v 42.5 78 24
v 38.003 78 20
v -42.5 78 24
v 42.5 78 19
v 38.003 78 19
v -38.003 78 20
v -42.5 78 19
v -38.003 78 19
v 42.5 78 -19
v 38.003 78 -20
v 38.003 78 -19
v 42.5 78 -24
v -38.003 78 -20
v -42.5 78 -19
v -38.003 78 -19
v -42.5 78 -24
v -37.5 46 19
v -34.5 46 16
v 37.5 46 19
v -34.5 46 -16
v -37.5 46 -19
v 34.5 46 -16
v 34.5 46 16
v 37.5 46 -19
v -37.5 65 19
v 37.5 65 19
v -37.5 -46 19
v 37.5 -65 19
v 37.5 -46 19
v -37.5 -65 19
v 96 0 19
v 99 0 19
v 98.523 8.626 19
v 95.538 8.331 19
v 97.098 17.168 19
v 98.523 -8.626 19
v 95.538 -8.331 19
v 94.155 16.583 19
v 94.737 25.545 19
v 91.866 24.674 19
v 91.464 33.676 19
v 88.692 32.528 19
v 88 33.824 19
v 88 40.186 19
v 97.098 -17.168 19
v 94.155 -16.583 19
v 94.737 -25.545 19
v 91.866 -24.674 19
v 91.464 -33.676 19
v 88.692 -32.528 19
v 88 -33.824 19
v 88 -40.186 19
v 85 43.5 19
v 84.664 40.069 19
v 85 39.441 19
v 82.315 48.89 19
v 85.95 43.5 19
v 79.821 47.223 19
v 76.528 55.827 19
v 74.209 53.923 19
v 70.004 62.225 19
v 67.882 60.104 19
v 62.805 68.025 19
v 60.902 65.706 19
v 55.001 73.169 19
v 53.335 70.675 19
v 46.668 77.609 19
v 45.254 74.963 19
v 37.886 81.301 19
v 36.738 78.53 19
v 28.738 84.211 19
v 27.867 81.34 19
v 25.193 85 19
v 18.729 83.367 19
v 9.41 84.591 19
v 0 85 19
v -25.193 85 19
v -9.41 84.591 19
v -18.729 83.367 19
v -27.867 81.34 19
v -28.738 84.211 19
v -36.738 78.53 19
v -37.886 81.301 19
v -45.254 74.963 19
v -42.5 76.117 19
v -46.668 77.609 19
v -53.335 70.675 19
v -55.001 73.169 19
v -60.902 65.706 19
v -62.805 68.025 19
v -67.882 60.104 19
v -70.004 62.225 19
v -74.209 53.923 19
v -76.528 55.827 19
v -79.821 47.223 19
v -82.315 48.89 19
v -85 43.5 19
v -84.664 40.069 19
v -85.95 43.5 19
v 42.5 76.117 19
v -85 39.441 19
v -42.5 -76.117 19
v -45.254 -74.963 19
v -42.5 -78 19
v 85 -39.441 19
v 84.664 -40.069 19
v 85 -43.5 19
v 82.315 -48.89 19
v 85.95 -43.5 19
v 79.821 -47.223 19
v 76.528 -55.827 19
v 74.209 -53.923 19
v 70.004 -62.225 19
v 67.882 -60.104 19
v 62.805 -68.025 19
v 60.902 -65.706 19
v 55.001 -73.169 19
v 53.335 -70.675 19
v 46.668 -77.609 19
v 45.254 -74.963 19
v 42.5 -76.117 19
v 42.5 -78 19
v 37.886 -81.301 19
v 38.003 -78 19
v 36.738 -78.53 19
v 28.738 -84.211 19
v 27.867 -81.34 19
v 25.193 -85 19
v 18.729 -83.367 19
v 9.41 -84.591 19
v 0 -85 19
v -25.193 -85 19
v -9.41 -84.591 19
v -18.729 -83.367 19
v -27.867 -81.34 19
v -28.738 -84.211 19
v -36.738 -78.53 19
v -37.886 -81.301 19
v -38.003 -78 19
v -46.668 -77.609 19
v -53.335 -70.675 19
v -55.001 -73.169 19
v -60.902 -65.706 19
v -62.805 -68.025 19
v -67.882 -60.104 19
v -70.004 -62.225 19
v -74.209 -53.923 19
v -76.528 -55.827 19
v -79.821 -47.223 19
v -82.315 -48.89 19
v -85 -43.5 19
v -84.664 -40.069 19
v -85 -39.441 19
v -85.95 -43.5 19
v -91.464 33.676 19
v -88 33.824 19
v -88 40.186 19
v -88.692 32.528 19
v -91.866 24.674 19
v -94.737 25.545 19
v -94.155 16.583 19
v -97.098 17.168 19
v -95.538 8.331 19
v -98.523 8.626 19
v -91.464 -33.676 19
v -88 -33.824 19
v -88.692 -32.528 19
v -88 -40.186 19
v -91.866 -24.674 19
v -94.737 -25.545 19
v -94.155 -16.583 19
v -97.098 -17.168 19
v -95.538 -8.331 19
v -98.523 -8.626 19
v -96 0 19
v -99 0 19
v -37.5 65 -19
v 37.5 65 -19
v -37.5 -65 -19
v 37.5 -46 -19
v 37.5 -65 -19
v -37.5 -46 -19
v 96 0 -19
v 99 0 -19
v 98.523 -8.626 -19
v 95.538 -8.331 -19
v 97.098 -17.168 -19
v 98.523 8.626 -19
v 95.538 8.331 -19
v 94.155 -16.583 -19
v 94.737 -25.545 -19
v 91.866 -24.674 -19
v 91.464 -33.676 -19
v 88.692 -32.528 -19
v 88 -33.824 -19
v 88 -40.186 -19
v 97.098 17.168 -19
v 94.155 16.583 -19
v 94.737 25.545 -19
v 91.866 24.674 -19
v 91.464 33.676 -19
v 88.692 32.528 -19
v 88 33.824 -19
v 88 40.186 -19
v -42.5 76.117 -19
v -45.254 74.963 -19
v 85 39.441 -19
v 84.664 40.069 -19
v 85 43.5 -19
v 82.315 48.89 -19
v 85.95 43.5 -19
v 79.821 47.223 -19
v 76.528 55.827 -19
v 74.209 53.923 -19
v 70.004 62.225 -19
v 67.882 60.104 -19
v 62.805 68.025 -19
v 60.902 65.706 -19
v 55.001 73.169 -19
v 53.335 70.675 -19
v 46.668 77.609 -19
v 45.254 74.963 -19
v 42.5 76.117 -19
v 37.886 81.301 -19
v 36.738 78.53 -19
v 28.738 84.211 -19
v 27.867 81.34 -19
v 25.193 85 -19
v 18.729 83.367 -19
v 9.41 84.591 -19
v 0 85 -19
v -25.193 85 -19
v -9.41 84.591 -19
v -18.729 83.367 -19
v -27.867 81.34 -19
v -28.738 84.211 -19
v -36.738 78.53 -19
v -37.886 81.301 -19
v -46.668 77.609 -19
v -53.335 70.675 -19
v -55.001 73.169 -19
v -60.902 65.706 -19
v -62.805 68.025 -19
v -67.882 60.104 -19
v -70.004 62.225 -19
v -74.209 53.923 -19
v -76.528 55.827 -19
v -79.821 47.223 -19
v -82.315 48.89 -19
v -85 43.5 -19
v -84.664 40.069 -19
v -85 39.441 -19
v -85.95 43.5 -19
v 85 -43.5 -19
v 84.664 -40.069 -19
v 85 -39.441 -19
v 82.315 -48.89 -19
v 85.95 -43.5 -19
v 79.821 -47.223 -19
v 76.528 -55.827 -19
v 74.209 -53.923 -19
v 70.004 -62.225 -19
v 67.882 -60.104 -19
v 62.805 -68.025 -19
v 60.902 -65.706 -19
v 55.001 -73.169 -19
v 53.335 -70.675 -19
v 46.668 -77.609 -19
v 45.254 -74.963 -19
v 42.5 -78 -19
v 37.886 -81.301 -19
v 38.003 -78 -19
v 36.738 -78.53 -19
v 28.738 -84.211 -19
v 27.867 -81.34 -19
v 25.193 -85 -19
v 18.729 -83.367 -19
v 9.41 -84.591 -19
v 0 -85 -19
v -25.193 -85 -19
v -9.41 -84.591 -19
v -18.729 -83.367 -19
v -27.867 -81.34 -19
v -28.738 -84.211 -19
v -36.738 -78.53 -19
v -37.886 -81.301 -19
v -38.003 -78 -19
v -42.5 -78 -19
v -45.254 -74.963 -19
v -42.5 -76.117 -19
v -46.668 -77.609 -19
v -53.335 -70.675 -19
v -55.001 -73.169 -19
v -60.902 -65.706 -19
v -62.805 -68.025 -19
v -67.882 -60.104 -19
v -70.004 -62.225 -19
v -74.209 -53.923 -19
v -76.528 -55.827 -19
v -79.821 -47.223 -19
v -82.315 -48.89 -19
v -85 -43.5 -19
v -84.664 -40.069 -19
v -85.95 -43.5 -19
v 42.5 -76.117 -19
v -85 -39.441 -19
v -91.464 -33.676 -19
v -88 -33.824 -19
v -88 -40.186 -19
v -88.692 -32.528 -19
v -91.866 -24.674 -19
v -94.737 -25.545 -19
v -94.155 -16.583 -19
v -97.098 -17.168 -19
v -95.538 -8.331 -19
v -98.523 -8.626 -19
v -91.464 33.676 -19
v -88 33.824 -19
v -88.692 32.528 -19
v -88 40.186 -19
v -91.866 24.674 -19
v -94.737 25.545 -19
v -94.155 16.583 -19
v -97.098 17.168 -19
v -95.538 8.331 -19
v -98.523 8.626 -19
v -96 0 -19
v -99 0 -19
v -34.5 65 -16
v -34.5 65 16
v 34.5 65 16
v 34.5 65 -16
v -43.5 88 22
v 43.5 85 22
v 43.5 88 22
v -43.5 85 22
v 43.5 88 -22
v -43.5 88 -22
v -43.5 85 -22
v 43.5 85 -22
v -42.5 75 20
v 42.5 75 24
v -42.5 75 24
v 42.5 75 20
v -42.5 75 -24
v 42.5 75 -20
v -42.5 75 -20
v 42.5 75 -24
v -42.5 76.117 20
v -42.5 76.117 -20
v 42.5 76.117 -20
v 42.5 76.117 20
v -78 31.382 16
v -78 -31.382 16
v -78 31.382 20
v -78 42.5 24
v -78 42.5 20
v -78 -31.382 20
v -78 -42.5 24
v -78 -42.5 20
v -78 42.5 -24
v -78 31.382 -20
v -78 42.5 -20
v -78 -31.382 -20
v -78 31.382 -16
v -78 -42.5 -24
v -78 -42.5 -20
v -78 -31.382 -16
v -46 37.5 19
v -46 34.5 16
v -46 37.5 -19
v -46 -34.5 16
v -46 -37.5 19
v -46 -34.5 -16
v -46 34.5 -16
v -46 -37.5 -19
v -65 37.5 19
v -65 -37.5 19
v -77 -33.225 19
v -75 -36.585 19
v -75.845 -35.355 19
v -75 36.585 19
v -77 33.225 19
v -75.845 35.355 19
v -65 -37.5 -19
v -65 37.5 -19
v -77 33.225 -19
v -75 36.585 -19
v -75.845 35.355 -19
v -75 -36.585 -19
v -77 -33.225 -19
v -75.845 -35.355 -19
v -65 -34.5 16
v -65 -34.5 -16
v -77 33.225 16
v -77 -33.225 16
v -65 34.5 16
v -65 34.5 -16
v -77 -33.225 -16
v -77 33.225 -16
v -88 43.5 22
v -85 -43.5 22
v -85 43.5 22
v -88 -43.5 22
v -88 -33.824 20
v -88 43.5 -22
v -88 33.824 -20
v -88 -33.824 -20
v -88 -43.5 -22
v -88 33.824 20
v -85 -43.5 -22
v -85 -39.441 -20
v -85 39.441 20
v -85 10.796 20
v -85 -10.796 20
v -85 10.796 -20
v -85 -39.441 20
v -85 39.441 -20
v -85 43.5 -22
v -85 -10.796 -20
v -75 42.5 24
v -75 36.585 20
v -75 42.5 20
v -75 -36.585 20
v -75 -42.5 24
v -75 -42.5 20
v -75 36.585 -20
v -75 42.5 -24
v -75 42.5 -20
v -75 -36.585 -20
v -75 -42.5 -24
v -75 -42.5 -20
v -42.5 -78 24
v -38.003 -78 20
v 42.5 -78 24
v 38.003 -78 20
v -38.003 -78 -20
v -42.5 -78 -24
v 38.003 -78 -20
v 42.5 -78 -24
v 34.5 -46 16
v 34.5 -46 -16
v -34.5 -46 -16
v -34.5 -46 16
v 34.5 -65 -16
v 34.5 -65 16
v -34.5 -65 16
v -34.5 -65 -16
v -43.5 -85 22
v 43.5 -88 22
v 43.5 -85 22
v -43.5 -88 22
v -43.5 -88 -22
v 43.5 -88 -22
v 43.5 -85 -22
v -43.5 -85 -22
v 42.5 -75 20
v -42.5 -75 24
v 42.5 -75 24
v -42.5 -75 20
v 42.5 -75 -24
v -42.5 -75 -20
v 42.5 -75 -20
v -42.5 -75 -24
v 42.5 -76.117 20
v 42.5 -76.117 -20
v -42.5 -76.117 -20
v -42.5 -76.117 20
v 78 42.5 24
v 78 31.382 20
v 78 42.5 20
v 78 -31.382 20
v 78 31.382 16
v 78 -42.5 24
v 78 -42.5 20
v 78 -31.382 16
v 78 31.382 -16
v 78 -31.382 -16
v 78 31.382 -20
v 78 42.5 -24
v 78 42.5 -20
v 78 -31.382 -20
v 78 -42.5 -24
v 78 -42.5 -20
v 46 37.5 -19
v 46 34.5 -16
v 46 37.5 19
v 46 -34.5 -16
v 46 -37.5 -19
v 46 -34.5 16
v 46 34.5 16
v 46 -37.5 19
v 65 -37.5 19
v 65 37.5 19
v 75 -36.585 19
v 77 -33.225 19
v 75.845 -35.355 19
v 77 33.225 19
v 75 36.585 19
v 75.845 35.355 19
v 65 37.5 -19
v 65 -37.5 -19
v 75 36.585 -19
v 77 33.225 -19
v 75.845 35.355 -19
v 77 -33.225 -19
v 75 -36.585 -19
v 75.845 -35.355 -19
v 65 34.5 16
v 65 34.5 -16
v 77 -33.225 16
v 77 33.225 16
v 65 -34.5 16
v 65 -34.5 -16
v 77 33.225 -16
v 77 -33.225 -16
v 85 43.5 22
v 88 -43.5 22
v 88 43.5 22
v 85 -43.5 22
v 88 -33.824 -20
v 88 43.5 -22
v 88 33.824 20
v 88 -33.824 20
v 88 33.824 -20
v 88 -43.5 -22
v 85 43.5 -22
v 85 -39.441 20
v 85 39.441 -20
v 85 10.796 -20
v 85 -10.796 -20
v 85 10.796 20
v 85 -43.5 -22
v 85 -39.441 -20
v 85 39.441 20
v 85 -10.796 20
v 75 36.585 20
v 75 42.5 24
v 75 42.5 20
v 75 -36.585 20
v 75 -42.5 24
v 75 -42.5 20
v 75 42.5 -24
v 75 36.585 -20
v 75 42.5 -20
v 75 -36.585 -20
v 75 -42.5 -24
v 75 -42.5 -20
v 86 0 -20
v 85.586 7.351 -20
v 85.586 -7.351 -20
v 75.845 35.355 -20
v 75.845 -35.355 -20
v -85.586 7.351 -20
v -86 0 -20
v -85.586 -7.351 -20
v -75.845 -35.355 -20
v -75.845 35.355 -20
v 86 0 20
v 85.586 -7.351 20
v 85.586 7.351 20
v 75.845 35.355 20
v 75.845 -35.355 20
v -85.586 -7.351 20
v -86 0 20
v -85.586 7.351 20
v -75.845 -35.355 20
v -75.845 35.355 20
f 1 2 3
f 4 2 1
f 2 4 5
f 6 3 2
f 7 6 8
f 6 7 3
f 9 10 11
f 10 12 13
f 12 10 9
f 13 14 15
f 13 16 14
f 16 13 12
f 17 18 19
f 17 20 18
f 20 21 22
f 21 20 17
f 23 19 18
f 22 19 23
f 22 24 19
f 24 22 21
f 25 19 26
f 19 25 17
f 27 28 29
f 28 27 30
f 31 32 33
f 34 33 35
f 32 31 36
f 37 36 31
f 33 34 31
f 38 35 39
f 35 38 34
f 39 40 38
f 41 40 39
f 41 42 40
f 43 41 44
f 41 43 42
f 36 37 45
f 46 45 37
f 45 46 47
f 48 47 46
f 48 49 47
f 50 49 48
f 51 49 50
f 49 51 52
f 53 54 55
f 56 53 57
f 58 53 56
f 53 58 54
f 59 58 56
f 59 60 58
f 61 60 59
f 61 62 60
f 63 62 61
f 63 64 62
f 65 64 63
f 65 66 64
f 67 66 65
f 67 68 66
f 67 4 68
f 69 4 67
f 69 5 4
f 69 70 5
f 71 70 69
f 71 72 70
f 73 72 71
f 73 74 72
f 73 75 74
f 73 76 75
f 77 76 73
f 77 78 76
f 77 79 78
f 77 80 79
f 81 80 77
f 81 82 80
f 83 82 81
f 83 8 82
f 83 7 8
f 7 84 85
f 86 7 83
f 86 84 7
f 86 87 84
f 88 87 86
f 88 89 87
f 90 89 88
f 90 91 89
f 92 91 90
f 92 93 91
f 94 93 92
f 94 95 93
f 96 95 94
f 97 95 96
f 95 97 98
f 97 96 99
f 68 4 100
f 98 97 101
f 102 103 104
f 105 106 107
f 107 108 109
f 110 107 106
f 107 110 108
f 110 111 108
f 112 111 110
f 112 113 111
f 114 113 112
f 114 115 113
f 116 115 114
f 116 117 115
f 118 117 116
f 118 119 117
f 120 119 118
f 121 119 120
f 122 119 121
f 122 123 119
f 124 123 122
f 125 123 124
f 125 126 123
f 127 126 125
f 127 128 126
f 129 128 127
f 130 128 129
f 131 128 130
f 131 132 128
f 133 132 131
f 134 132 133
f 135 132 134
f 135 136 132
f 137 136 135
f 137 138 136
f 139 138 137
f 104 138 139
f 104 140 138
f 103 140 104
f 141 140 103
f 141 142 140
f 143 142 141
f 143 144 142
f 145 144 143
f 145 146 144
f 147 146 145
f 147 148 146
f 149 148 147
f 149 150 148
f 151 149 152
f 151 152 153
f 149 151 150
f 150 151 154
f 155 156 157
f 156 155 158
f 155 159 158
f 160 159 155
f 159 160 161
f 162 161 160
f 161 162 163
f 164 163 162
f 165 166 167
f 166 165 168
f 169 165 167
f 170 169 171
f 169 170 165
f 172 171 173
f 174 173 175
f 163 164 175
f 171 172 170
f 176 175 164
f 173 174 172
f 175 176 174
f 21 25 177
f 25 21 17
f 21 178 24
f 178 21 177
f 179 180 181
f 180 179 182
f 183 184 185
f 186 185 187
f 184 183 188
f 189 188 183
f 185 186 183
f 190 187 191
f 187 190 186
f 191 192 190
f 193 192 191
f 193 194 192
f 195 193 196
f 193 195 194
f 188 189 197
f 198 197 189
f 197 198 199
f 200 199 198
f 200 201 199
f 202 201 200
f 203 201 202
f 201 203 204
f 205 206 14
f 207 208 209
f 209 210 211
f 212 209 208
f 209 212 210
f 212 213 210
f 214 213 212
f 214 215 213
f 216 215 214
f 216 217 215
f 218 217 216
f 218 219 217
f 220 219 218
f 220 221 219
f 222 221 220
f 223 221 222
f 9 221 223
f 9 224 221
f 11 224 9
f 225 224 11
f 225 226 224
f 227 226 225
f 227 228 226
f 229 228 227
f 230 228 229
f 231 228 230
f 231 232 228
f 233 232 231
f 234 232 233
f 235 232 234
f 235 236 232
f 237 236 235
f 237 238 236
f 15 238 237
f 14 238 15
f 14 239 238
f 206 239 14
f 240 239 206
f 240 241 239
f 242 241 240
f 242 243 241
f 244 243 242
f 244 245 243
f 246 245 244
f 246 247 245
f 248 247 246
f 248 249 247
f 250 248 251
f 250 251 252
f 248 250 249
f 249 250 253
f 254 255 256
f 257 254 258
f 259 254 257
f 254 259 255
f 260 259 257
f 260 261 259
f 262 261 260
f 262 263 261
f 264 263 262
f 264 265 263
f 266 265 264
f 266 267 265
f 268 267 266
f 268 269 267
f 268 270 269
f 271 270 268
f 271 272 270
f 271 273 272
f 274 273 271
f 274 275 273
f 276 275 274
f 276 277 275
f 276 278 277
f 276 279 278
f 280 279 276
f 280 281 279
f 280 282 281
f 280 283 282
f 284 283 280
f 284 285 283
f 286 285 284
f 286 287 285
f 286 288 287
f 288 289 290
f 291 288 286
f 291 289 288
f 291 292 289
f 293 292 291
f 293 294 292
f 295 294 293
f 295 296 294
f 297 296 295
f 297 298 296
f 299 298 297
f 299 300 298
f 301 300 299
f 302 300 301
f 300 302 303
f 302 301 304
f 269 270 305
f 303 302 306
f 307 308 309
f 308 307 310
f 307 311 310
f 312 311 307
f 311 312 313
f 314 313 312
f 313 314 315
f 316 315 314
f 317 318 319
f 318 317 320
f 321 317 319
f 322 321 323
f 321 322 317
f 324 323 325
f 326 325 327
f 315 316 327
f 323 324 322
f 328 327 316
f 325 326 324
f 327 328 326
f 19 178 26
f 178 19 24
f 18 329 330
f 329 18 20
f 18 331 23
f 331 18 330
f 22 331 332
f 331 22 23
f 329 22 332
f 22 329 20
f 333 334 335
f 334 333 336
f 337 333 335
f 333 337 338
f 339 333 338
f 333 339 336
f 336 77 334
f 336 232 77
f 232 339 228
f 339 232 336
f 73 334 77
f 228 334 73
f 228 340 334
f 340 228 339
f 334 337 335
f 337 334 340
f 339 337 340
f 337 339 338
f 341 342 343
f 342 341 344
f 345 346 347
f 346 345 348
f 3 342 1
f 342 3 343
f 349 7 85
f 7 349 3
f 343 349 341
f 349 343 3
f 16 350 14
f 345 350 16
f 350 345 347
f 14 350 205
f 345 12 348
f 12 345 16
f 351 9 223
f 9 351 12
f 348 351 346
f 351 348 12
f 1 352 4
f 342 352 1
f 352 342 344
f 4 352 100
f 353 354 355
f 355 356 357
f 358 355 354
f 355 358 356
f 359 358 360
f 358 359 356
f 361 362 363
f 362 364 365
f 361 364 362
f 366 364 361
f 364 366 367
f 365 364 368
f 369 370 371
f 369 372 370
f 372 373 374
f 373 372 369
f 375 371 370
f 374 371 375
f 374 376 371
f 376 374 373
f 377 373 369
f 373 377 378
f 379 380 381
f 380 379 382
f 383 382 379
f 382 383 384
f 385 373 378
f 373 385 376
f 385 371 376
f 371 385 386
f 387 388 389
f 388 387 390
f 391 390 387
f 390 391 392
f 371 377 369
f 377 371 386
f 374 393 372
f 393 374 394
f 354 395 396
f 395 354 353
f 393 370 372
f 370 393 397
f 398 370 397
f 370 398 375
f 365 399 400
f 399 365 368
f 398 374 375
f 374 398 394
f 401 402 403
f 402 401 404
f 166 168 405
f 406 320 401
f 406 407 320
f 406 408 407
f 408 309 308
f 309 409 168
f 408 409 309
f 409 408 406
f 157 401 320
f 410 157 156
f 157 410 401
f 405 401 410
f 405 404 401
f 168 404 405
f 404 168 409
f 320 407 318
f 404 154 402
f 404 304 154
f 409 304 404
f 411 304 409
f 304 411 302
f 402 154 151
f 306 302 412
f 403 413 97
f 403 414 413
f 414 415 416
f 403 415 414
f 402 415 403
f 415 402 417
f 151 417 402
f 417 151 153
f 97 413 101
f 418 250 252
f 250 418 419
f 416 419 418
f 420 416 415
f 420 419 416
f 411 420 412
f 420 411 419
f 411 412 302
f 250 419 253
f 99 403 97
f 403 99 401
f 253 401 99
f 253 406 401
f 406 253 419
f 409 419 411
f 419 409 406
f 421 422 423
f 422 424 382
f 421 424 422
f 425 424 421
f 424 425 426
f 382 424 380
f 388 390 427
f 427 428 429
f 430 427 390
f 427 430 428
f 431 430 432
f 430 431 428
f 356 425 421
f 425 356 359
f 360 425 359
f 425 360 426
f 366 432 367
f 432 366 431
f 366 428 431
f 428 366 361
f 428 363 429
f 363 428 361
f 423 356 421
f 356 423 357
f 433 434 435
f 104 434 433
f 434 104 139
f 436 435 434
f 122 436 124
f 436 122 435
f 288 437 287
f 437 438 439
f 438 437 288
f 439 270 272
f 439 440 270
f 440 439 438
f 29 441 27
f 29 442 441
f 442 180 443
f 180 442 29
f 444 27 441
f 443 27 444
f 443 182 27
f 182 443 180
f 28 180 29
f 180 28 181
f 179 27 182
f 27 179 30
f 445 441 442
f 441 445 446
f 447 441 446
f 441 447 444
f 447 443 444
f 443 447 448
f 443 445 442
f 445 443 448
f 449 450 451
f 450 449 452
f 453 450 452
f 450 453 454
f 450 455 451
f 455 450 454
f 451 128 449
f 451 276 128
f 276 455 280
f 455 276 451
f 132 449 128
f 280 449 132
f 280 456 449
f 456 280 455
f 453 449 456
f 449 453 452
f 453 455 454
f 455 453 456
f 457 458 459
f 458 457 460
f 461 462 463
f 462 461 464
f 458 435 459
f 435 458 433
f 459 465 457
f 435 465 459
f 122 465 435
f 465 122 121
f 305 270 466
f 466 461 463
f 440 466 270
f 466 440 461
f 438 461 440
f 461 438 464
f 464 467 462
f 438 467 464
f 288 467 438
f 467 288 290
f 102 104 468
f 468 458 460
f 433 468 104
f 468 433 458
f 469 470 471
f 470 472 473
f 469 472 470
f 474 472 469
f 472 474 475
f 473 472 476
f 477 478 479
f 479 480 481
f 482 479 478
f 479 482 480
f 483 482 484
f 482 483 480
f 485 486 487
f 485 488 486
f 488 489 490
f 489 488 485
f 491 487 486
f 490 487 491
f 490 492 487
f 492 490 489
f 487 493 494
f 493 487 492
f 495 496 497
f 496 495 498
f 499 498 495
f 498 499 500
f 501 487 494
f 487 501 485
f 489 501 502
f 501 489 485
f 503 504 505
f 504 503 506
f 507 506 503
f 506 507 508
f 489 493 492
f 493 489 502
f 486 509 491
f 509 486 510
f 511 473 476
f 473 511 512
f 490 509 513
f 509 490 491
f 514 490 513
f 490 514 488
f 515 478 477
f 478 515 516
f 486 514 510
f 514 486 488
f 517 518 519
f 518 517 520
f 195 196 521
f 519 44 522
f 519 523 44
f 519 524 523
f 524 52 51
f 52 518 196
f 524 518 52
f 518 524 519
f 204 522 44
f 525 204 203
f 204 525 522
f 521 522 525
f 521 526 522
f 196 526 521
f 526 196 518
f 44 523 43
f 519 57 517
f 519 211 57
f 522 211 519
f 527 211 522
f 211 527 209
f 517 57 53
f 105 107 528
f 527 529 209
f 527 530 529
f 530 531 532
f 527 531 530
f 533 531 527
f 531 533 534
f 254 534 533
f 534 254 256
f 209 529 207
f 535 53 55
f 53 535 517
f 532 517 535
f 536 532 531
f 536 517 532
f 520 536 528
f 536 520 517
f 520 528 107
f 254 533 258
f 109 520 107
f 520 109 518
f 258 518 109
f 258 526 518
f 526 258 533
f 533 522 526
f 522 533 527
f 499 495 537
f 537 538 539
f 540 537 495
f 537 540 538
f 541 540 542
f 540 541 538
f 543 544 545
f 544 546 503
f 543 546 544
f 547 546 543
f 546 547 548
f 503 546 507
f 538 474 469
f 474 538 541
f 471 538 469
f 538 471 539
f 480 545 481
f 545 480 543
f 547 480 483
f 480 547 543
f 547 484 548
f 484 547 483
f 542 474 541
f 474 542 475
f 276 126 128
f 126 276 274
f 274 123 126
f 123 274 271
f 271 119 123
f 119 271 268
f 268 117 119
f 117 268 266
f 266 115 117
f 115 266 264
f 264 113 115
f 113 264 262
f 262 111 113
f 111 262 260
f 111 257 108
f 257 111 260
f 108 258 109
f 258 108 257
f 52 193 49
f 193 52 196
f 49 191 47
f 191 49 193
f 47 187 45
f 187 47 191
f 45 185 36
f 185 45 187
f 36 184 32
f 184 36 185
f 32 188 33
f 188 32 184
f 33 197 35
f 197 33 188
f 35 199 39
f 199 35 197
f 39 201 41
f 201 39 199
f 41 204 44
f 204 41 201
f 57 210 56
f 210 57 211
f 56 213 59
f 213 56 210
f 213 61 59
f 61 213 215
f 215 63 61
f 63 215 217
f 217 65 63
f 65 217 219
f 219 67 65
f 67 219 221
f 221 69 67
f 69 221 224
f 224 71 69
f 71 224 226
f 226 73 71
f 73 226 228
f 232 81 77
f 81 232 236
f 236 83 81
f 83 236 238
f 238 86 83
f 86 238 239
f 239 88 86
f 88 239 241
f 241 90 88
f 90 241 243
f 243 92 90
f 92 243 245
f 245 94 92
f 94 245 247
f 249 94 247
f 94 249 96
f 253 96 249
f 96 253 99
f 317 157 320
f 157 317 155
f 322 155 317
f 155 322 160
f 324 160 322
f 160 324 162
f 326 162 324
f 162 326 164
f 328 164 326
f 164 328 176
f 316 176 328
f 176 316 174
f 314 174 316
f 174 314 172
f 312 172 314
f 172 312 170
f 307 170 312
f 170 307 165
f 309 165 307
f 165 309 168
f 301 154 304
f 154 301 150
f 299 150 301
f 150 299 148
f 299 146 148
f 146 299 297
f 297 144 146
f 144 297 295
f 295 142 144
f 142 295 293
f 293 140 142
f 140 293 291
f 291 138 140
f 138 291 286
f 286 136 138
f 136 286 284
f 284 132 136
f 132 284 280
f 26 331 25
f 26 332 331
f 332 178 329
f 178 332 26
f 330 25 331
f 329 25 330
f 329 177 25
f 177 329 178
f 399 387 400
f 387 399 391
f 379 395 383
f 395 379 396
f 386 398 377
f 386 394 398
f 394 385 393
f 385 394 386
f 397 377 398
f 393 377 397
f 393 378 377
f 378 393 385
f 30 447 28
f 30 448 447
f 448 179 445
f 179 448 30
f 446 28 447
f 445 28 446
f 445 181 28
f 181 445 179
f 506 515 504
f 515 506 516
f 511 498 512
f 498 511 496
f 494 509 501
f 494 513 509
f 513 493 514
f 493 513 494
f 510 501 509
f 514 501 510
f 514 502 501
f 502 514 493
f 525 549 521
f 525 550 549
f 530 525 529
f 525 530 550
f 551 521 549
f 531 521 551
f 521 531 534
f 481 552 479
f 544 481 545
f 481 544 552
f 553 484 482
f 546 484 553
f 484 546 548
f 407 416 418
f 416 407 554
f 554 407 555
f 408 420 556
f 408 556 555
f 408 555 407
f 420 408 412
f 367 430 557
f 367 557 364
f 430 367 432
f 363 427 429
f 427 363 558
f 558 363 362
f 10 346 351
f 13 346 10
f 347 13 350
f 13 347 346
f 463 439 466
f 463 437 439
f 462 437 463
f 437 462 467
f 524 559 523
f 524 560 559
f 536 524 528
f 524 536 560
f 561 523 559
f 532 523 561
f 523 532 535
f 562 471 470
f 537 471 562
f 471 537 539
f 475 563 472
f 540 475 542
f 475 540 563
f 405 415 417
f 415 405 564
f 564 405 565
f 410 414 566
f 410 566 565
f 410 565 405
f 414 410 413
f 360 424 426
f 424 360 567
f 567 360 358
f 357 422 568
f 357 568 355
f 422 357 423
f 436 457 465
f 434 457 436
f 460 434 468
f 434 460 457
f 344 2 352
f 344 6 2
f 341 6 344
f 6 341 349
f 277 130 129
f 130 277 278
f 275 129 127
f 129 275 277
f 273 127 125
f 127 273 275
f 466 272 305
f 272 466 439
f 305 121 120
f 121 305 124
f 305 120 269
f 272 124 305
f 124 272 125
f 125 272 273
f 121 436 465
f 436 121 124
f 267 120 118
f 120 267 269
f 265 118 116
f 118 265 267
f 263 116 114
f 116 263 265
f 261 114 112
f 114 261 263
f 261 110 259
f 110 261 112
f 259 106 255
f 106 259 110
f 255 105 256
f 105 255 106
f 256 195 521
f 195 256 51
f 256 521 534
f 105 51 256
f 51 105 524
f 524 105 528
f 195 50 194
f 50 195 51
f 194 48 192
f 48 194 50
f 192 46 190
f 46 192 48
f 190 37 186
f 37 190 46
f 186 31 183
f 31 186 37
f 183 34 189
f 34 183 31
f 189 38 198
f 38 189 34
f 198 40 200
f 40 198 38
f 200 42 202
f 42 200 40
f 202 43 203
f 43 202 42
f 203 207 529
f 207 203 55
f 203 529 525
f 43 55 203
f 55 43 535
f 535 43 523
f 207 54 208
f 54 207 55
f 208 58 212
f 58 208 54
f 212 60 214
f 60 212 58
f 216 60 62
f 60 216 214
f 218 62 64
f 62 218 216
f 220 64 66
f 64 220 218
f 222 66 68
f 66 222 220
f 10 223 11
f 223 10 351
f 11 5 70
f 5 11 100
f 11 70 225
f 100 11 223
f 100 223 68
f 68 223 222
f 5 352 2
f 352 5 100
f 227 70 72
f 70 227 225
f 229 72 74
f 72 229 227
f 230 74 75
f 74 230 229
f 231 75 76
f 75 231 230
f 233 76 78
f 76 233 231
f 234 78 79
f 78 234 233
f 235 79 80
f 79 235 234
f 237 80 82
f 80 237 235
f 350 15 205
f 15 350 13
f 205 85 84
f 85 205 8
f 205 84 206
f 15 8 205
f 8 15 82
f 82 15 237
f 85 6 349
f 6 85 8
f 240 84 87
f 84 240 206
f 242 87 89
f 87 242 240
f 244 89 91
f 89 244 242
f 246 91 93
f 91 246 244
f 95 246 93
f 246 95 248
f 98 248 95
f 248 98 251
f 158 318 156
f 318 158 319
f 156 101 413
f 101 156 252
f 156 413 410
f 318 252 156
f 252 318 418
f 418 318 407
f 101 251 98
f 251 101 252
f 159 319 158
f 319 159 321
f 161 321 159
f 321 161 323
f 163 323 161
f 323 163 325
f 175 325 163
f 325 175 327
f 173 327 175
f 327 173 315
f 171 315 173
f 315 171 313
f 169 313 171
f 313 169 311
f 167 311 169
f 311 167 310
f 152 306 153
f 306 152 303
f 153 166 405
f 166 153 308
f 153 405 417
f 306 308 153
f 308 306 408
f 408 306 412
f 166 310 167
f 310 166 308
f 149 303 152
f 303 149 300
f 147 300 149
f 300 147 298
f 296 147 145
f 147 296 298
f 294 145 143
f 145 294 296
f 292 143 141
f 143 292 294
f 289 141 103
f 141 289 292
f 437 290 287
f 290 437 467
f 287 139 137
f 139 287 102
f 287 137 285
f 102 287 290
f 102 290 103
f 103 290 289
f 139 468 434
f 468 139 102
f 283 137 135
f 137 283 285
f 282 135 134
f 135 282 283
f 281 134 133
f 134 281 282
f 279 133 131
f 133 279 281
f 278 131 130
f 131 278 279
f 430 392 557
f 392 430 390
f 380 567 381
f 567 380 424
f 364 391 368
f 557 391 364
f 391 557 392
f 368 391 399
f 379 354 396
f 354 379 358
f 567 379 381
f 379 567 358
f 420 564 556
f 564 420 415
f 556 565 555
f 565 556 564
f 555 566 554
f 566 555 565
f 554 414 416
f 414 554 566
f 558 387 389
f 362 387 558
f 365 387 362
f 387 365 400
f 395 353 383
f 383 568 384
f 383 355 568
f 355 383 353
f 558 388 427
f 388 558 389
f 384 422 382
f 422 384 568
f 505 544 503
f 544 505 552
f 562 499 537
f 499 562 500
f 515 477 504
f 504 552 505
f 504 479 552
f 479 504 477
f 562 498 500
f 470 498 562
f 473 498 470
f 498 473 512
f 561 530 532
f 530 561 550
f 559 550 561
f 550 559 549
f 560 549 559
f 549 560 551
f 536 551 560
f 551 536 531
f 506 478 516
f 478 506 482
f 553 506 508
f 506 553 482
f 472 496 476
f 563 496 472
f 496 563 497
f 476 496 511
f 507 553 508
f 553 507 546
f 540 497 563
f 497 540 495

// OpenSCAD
// ===========================================================================
// HULL-FRAME COORDINATE STANDARD - Rev R1 (2026-06-11).  See CLAUDE.md.
//   Hull frame (canonical for ALL design artifacts): X = +port (left),
//   Y = +aft (back), Z = +dorsal (up); origin = SerenityAssembly.FCStd
//   world origin.  Primary-component STLs published to airframe/stls/
//   are stored directly in hull frame, baked by tools/bake_hull_frame.py
//   (marker 'SerenityUAV HULL-FRAME R1' in the binary STL header).
//   NEVER re-bake a mesh derived from an already-baked file.
//   This file:
//     Part-local frame.  DEFERRED - Phase 11 (aft fuselage EDF).  On
//     integration, position in hull frame per the validated assembly and
//     bake or place explicitly; stations quoted from nose convert to hull
//     Y via nose tip at hull Y = -305.6 mm.
// ===========================================================================
// s_neck_intake_frame.scad
// CF-PETG structural intake frame ring for Serenity Rev N 24" hull.
// Bonds into the 4 radial scoop cutouts in s_middle_canonical_edf_intake.stl
// at the neck station (Z = 30 mm in the neck shell, Z-longitudinal coords).
// Print in CF-PETG; bond with structural epoxy.
//
// Rev C (2026-06-02): Z-longitudinal axis correction.
//   Coordinate system: Z = longitudinal (fore-aft), X = lateral, Y = vertical.
//   Both middle and rear shells sit on their flat Z=0 face for printing.
//   Hull dimensions re-measured via Z-slice at Z=30 mm.
//   See blender_middle_intake_cut.py Rev C for matching hull cut parameters.
//
// Coordinate origin: hull XY centreline at intake station.
// Frame axial direction = Z (same as hull longitudinal).

// ── Hull cross-section at intake station Z = 30 mm (measured, 24" scale) ────
// Source: Z-slice sweep of s_middle_canonical_shell24.stl,
//   Serenity UAV project log 2026-06-02 (Z-longitudinal Rev C).
// At Z=30: X span=177 mm (centre X=180.9), Y span=156.5 mm (centre Y=-77.8).
// Half-dimensions from XY centreline:
//   X half-width  = 88.5 mm → HULL_W2 = 89
//   Y half-height = 78.3 mm → HULL_H2 = 78
HULL_W2  = 89;     // X lateral half-width from centreline       [mm]
HULL_H2  = 78;     // Y vertical half-height from centreline     [mm]
HULL_WL  = 177;    // full width  (= 2 × HULL_W2 − 1)
HULL_HL  = 157;    // full height (= 2 × HULL_H2 + rounding)

// ── Scoop window dimensions ──────────────────────────────────────────────────
// Matched to blender_middle_intake_cut.py Rev C: SCOOP_W=75, SCOOP_H=38.
// X-scoops: 48 mm wall remaining.  Y-scoops: 37 mm wall remaining.
// Total capture area: 4 × 75 × 38 = 11 400 mm² (≈ 107 % of EDF fan annulus).
SCOOP_W  = 75;     // circumferential window width               [mm]
SCOOP_H  = 38;     // radial window height                       [mm]

// ── Frame geometry ───────────────────────────────────────────────────────────
FRAME_AX = 38;     // axial length of frame ring (matches SCOOP_AX) [mm]
FRAME_RD = 10;     // radial depth of frame collar               [mm]
WALL     =  3;     // CF-PETG wall thickness                     [mm]
TONGUE_D =  5;     // tongue depth inserting into hull cutout    [mm]
SHOULDER =  5;     // bonding shoulder pressing on hull exterior  [mm]
LIP      =  6;     // forward aerodynamic lip projection          [mm]
DUCT_L   = 22;     // internal duct arm length inward (→ plenum) [mm]

// ── Derived ─────────────────────────────────────────────────────────────────
$fn = 64;
HALF_AX  = FRAME_AX / 2;

// ── Main module ─────────────────────────────────────────────────────────────
module neck_intake_frame() {
    difference() {
        union() {
            _elliptical_collar();
            for (a = [0, 90, 180, 270])
                rotate([0, 0, a]) _scoop_duct();
        }
        // Cut the 4 scoop windows through the collar
        for (a = [0, 90, 180, 270])
            rotate([0, 0, a]) _scoop_window();
        // Hollow the collar interior (leave WALL-thick walls)
        _collar_hollow();
    }
}

// Elliptical ring collar that matches hull outer profile + FRAME_RD
module _elliptical_collar() {
    linear_extrude(height = FRAME_AX, center = true)
    difference() {
        // Outer ellipse: hull outer surface + frame radial depth
        scale([(HULL_W2 + FRAME_RD) / HULL_W2,
               (HULL_H2 + FRAME_RD) / HULL_H2])
            ellipse(HULL_W2, HULL_H2);
        // Inner cut: hull outer surface (frame sits on hull exterior)
        ellipse(HULL_W2, HULL_H2);
    }
}

// Thin-wall hollow inside the collar (keep WALL thickness)
module _collar_hollow() {
    linear_extrude(height = FRAME_AX + 2, center = true)
    difference() {
        scale([(HULL_W2 + FRAME_RD - WALL) / HULL_W2,
               (HULL_H2 + FRAME_RD - WALL) / HULL_H2])
            ellipse(HULL_W2, HULL_H2);
        ellipse(HULL_W2 - WALL, HULL_H2 - WALL);
    }
}

// One scoop duct arm (placed pointing +Y before rotation)
// Extends radially inward from the collar opening toward the plenum
module _scoop_duct() {
    // Duct arm: rectangular tube from hull inner wall to plenum centre
    translate([0, HULL_H2, 0])
    rotate([90, 0, 0])
    linear_extrude(height = DUCT_L + FRAME_RD)
    difference() {
        square([SCOOP_W, SCOOP_H], center = true);
        square([SCOOP_W - 2*WALL, SCOOP_H - 2*WALL], center = true);
    }

    // Aerodynamic intake lip on forward edge
    translate([0, HULL_H2 + FRAME_RD, 0])
    rotate([90, 0, 0])
    linear_extrude(height = WALL)
    hull() {
        square([SCOOP_W, SCOOP_H], center = true);
        square([SCOOP_W + LIP*2, SCOOP_H + LIP], center = true);
    }

    // Registration tongue: projects into hull cutout (thin, snug fit)
    translate([0, HULL_H2 - TONGUE_D, 0])
    rotate([90, 0, 0])
    linear_extrude(height = TONGUE_D)
    square([SCOOP_W - 0.4, SCOOP_H - 0.4], center = true);  // 0.2mm clearance

    // Bonding shoulder: flange pressing on hull exterior
    translate([0, HULL_H2, 0])
    rotate([90, 0, 0])
    linear_extrude(height = WALL)
    difference() {
        square([SCOOP_W + SHOULDER*2, SCOOP_H + SHOULDER*2], center = true);
        square([SCOOP_W, SCOOP_H], center = true);
    }
}

// Window cut through collar at each scoop position
module _scoop_window() {
    translate([0, HULL_H2 - 1, 0])
    rotate([90, 0, 0])
    linear_extrude(height = FRAME_RD + 2)
    square([SCOOP_W, SCOOP_H], center = true);
}

// Helper: 2D ellipse
module ellipse(rx, ry) {
    scale([rx, ry]) circle(r = 1);
}

neck_intake_frame();
